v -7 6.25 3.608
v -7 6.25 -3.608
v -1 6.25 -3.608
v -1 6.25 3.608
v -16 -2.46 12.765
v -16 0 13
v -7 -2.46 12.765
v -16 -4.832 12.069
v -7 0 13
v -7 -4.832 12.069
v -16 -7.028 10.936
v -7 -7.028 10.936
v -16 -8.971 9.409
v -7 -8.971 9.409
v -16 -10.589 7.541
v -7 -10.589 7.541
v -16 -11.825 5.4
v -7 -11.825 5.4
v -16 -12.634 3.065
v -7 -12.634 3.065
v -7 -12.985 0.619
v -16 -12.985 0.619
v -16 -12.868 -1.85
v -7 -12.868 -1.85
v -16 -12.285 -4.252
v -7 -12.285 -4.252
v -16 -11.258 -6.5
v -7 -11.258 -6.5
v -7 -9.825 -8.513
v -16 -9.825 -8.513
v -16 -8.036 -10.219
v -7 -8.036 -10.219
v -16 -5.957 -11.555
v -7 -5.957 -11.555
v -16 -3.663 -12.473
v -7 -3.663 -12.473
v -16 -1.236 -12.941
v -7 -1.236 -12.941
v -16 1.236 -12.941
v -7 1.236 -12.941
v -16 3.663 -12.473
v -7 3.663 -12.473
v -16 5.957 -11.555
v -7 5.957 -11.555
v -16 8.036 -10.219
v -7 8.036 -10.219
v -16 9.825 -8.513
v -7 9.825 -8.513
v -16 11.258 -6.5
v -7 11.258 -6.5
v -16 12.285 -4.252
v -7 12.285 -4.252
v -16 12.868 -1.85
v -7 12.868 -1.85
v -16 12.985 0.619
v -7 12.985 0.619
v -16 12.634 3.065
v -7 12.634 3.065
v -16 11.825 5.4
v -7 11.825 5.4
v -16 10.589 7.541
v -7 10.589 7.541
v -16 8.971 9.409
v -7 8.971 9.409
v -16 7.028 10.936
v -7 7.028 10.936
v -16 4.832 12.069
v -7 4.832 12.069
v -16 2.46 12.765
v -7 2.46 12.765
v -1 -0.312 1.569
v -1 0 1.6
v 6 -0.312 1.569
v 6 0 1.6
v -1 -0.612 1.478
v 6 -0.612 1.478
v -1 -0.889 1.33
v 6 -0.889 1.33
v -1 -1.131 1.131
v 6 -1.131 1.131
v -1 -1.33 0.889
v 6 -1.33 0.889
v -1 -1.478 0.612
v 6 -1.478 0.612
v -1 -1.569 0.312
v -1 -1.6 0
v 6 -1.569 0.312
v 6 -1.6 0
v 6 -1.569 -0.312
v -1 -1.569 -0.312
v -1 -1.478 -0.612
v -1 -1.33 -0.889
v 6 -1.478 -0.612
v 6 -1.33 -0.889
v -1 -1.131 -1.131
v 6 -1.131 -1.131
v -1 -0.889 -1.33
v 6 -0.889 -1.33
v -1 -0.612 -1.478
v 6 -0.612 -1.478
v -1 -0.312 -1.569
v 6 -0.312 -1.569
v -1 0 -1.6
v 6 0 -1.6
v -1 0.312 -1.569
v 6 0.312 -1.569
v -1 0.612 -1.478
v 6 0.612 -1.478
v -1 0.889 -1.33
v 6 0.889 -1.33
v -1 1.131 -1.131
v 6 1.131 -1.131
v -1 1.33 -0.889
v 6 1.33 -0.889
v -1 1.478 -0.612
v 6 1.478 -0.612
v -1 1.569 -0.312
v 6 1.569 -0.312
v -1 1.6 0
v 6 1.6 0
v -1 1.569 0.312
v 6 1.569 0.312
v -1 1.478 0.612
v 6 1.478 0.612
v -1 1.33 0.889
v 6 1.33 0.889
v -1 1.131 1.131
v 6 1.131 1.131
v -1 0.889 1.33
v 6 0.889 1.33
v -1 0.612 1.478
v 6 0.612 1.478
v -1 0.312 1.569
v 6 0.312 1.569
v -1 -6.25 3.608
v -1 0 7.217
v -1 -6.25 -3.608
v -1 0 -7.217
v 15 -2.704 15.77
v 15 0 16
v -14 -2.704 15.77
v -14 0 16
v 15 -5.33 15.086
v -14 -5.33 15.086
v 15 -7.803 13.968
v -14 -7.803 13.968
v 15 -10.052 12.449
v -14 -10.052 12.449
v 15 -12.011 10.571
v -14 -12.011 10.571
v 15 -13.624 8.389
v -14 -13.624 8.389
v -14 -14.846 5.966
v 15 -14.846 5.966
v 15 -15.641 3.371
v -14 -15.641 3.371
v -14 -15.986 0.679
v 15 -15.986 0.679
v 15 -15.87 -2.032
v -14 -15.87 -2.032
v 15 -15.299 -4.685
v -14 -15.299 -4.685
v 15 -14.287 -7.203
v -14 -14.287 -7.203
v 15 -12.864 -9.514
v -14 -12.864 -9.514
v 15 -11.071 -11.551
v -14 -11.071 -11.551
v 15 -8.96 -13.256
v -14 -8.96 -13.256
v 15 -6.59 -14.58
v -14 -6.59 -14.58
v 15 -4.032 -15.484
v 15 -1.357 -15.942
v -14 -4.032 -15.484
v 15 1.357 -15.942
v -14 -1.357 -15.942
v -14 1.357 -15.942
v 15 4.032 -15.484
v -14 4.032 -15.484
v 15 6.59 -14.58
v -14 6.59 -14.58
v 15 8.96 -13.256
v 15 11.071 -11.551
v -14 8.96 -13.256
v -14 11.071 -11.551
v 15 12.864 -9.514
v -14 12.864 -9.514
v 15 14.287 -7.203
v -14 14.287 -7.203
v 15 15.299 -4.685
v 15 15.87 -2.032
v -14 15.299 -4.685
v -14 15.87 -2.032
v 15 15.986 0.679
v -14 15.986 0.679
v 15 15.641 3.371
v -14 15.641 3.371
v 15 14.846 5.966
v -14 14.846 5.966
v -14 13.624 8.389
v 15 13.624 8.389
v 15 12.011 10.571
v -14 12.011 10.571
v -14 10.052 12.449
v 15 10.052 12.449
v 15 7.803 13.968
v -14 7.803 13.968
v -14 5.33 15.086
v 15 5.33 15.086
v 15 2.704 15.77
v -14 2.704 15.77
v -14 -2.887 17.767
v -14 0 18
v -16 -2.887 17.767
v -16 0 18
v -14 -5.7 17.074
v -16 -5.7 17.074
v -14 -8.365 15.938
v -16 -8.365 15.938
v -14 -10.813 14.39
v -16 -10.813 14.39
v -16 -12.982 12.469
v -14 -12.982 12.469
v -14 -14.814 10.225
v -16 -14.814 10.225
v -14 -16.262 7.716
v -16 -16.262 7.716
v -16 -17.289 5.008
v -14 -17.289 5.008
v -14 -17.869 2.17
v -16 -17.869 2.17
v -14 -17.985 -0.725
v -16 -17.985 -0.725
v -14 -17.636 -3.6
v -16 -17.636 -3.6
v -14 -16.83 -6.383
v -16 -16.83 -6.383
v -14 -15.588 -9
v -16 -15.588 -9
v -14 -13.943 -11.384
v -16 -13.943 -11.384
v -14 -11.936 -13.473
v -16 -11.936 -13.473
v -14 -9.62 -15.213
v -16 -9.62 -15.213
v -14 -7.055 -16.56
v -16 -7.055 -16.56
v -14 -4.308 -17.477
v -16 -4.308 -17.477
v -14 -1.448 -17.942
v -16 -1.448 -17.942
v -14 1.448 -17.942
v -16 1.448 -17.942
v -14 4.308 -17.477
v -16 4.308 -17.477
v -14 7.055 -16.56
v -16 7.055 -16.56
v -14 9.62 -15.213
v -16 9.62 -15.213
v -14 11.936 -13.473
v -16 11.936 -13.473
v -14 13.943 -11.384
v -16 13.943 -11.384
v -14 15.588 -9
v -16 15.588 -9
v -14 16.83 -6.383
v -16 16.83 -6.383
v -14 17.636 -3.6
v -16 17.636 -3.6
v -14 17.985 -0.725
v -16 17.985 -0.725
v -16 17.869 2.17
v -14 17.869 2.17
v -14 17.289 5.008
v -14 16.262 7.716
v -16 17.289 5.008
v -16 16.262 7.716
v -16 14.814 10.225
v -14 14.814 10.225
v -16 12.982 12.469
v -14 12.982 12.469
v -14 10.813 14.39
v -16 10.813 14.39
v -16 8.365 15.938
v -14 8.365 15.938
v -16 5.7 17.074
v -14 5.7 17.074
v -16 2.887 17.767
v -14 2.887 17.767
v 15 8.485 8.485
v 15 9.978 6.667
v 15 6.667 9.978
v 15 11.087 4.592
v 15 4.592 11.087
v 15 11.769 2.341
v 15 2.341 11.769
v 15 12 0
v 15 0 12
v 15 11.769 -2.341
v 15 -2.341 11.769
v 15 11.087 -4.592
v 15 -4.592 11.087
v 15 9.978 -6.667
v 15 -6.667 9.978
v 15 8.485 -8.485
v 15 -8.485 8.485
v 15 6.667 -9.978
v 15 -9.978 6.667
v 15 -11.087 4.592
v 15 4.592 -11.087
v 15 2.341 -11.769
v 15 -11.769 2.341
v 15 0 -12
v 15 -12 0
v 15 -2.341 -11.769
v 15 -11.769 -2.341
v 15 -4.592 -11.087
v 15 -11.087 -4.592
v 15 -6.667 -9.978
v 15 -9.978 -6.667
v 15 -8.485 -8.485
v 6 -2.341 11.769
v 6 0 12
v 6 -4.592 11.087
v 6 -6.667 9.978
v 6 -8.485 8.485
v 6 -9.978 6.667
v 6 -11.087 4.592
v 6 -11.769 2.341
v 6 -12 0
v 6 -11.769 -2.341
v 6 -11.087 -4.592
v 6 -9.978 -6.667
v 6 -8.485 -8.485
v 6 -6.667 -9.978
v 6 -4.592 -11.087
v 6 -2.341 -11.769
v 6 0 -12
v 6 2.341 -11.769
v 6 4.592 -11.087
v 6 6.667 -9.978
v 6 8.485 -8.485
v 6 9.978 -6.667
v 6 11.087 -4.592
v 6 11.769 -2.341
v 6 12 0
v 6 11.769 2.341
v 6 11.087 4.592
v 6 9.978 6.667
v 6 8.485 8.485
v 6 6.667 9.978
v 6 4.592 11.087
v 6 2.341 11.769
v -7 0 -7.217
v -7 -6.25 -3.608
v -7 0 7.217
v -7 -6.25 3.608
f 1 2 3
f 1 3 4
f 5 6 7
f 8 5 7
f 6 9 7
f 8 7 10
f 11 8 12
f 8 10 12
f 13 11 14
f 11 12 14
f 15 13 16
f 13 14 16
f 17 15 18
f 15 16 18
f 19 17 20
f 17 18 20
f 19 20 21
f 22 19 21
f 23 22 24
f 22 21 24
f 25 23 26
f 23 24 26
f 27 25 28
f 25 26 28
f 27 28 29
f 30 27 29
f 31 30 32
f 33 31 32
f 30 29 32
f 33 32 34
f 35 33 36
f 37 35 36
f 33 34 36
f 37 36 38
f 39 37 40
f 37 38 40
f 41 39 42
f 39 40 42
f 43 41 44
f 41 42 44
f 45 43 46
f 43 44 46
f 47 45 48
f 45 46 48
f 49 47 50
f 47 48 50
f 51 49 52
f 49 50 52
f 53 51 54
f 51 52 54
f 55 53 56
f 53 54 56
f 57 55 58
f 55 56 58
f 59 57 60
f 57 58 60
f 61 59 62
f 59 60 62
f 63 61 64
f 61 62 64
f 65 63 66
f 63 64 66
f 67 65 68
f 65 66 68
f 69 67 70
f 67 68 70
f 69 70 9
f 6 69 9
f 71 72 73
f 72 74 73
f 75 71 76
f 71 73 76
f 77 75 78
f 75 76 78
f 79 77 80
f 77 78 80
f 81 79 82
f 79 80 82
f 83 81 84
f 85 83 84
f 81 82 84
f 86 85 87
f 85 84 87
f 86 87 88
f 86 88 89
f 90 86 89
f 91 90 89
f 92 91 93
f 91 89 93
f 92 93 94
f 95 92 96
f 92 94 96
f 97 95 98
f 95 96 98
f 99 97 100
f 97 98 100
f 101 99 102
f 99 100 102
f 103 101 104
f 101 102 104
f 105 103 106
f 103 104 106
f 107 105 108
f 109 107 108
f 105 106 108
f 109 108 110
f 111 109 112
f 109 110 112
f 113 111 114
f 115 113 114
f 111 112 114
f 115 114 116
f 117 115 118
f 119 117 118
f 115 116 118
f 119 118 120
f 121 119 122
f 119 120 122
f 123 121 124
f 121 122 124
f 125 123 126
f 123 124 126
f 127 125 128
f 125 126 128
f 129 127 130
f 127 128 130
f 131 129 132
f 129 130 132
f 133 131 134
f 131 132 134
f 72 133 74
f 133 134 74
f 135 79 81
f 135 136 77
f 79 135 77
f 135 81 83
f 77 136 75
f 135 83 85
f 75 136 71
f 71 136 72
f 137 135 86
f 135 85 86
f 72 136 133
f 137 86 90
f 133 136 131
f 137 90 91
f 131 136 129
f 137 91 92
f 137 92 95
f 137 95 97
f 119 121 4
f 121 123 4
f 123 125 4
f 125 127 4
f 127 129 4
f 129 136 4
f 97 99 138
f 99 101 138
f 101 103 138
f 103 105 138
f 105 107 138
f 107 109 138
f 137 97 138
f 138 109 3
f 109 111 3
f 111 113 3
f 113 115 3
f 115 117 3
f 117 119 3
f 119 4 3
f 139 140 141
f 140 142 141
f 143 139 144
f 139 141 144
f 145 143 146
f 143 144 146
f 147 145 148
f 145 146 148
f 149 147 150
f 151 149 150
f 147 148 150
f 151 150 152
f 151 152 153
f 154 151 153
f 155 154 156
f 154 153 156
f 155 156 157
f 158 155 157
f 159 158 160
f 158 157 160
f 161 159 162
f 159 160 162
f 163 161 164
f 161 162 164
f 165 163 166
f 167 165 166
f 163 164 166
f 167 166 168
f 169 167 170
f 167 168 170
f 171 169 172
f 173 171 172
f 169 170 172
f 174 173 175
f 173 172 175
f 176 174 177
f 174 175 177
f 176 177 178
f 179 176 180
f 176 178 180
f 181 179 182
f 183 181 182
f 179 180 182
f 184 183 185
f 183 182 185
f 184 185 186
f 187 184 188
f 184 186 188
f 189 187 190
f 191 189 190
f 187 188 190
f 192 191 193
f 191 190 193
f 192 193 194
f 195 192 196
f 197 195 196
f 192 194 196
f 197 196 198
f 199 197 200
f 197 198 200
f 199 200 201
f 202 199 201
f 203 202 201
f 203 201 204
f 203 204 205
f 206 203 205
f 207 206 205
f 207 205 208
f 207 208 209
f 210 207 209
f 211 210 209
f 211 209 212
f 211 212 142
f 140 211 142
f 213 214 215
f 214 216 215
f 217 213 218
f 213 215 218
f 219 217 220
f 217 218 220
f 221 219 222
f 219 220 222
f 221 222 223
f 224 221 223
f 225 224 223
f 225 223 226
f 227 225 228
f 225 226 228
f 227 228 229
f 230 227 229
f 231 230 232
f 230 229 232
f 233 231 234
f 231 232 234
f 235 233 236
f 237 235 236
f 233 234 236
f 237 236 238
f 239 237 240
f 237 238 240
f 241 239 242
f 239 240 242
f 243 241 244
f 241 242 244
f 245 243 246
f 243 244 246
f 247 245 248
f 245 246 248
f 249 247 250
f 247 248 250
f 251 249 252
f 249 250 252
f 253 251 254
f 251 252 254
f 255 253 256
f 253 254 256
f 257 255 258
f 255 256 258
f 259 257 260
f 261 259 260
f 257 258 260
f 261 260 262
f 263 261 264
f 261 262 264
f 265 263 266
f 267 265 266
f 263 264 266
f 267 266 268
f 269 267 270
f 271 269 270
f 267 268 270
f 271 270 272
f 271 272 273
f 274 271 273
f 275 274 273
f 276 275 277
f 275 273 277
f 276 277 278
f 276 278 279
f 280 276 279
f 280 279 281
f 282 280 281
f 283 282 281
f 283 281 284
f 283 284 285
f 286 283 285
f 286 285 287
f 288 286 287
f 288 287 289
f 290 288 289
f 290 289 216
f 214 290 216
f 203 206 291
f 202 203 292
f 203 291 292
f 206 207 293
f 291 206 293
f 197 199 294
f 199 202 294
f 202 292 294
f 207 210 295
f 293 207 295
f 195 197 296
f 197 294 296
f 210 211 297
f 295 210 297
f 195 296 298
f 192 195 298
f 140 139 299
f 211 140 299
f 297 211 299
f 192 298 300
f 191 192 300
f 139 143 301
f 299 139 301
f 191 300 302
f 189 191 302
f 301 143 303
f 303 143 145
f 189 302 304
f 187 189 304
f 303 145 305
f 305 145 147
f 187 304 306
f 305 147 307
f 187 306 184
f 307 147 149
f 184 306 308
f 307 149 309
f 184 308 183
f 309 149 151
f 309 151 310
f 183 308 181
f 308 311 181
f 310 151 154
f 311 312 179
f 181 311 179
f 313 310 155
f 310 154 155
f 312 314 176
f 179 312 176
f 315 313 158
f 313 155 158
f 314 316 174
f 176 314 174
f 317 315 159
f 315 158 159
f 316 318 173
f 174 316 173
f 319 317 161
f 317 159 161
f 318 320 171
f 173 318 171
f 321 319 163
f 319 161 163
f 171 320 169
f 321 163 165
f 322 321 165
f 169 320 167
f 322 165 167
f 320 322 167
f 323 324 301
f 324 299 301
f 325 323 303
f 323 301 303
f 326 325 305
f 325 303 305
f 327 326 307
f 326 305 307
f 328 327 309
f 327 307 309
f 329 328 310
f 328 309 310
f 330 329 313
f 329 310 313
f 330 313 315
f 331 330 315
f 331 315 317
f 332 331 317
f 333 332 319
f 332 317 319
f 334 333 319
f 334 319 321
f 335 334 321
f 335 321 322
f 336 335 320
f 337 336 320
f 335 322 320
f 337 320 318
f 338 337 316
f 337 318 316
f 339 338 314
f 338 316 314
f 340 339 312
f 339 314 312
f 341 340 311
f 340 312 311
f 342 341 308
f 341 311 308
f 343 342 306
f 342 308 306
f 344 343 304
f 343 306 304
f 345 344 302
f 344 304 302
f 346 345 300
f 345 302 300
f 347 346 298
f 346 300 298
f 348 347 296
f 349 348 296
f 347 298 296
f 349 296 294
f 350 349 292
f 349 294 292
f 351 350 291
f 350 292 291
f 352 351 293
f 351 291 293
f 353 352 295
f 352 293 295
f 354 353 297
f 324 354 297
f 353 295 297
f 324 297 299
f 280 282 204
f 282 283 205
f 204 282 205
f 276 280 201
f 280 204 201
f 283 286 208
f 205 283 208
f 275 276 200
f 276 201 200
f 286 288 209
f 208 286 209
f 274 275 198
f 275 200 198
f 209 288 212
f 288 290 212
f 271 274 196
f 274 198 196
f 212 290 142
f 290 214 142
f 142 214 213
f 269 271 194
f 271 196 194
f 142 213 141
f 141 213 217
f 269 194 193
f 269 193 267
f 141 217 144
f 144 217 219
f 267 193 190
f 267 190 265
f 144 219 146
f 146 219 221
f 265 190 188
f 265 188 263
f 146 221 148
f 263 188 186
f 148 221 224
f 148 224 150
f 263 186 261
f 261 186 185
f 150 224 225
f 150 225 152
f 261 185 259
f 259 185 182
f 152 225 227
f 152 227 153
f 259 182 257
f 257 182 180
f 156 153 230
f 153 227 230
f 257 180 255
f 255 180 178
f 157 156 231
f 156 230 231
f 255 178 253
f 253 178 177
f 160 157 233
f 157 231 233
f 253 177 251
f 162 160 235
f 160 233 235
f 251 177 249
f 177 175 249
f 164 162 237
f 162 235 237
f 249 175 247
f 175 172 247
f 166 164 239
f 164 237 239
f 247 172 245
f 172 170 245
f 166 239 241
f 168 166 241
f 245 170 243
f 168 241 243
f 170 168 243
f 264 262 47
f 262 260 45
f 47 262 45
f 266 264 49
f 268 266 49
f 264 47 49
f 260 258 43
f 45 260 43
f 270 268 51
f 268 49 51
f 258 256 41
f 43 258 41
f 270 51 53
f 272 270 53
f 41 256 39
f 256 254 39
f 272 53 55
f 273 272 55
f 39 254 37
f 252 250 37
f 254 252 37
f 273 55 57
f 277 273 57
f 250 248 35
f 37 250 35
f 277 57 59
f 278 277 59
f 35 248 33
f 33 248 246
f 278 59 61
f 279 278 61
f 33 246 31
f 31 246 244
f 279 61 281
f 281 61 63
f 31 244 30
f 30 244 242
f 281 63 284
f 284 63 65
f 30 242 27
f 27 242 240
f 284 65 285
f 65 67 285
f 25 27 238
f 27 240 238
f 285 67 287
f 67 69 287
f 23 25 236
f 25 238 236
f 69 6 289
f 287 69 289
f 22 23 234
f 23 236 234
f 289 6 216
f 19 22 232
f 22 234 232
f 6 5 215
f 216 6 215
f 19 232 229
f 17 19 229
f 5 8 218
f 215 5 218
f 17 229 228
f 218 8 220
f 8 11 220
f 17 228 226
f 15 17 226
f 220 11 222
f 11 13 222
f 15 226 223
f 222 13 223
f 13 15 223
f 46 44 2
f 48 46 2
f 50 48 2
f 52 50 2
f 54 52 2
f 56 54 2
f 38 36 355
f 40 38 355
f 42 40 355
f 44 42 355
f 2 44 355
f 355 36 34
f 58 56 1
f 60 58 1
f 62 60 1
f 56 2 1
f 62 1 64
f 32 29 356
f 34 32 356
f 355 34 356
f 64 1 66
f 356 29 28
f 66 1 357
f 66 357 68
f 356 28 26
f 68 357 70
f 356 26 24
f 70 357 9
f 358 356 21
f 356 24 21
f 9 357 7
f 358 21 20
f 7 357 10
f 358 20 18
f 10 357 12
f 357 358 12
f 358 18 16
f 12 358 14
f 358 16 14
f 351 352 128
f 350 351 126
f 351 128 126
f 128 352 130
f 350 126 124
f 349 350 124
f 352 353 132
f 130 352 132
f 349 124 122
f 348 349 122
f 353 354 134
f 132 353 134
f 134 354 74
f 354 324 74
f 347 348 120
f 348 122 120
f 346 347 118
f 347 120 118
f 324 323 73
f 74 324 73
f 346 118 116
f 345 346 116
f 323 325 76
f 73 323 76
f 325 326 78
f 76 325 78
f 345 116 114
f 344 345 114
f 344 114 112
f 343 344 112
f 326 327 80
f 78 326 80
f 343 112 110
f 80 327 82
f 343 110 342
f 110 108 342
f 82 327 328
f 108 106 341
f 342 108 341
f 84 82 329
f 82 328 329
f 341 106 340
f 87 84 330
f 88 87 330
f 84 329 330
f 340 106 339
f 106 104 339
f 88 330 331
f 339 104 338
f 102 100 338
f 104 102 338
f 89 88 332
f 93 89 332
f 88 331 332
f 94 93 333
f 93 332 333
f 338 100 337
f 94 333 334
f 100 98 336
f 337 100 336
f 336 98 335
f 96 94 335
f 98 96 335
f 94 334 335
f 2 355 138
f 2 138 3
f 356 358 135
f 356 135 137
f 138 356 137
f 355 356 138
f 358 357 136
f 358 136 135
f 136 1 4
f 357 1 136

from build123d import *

# Parameters (mm, degrees)
CUT_EXTRUDE1_START = -7
CUT_EXTRUDE1_DEPTH = 6


with BuildPart() as part:
    # Sketch3 → Revolve1 (revolve)
    with BuildSketch(Plane.XY, mode=Mode.PRIVATE) as revolve1_sk:
        Polygon((-7, 1.6), (6, 1.6), (6, 12), (15, 12), (15, 16), (-14, 16), (-14, 18), (-16, 18), (-16, 13), (-7, 13), align=None)
    revolve(revolve1_sk.sketch.rotate(Axis((0, 0, 0), (1, 0, 0)), 90), axis=Axis((0, 0, 0), (1, 0, 0)))

    # Sketch4 → Cut-Extrude1 (cut)
    with BuildSketch(Plane(origin=(0, 0, 0), x_dir=(0, 0, -1), z_dir=(1, 0, 0)).offset(CUT_EXTRUDE1_START)):
        Polygon((3.608439182, 6.25), (-3.608439182, 6.25), (-7.216878365, 0), (-3.608439182, -6.25), (3.608439182, -6.25), (7.216878365, 0), align=None)
    extrude(amount=CUT_EXTRUDE1_DEPTH, mode=Mode.SUBTRACT)


solid = part.part
